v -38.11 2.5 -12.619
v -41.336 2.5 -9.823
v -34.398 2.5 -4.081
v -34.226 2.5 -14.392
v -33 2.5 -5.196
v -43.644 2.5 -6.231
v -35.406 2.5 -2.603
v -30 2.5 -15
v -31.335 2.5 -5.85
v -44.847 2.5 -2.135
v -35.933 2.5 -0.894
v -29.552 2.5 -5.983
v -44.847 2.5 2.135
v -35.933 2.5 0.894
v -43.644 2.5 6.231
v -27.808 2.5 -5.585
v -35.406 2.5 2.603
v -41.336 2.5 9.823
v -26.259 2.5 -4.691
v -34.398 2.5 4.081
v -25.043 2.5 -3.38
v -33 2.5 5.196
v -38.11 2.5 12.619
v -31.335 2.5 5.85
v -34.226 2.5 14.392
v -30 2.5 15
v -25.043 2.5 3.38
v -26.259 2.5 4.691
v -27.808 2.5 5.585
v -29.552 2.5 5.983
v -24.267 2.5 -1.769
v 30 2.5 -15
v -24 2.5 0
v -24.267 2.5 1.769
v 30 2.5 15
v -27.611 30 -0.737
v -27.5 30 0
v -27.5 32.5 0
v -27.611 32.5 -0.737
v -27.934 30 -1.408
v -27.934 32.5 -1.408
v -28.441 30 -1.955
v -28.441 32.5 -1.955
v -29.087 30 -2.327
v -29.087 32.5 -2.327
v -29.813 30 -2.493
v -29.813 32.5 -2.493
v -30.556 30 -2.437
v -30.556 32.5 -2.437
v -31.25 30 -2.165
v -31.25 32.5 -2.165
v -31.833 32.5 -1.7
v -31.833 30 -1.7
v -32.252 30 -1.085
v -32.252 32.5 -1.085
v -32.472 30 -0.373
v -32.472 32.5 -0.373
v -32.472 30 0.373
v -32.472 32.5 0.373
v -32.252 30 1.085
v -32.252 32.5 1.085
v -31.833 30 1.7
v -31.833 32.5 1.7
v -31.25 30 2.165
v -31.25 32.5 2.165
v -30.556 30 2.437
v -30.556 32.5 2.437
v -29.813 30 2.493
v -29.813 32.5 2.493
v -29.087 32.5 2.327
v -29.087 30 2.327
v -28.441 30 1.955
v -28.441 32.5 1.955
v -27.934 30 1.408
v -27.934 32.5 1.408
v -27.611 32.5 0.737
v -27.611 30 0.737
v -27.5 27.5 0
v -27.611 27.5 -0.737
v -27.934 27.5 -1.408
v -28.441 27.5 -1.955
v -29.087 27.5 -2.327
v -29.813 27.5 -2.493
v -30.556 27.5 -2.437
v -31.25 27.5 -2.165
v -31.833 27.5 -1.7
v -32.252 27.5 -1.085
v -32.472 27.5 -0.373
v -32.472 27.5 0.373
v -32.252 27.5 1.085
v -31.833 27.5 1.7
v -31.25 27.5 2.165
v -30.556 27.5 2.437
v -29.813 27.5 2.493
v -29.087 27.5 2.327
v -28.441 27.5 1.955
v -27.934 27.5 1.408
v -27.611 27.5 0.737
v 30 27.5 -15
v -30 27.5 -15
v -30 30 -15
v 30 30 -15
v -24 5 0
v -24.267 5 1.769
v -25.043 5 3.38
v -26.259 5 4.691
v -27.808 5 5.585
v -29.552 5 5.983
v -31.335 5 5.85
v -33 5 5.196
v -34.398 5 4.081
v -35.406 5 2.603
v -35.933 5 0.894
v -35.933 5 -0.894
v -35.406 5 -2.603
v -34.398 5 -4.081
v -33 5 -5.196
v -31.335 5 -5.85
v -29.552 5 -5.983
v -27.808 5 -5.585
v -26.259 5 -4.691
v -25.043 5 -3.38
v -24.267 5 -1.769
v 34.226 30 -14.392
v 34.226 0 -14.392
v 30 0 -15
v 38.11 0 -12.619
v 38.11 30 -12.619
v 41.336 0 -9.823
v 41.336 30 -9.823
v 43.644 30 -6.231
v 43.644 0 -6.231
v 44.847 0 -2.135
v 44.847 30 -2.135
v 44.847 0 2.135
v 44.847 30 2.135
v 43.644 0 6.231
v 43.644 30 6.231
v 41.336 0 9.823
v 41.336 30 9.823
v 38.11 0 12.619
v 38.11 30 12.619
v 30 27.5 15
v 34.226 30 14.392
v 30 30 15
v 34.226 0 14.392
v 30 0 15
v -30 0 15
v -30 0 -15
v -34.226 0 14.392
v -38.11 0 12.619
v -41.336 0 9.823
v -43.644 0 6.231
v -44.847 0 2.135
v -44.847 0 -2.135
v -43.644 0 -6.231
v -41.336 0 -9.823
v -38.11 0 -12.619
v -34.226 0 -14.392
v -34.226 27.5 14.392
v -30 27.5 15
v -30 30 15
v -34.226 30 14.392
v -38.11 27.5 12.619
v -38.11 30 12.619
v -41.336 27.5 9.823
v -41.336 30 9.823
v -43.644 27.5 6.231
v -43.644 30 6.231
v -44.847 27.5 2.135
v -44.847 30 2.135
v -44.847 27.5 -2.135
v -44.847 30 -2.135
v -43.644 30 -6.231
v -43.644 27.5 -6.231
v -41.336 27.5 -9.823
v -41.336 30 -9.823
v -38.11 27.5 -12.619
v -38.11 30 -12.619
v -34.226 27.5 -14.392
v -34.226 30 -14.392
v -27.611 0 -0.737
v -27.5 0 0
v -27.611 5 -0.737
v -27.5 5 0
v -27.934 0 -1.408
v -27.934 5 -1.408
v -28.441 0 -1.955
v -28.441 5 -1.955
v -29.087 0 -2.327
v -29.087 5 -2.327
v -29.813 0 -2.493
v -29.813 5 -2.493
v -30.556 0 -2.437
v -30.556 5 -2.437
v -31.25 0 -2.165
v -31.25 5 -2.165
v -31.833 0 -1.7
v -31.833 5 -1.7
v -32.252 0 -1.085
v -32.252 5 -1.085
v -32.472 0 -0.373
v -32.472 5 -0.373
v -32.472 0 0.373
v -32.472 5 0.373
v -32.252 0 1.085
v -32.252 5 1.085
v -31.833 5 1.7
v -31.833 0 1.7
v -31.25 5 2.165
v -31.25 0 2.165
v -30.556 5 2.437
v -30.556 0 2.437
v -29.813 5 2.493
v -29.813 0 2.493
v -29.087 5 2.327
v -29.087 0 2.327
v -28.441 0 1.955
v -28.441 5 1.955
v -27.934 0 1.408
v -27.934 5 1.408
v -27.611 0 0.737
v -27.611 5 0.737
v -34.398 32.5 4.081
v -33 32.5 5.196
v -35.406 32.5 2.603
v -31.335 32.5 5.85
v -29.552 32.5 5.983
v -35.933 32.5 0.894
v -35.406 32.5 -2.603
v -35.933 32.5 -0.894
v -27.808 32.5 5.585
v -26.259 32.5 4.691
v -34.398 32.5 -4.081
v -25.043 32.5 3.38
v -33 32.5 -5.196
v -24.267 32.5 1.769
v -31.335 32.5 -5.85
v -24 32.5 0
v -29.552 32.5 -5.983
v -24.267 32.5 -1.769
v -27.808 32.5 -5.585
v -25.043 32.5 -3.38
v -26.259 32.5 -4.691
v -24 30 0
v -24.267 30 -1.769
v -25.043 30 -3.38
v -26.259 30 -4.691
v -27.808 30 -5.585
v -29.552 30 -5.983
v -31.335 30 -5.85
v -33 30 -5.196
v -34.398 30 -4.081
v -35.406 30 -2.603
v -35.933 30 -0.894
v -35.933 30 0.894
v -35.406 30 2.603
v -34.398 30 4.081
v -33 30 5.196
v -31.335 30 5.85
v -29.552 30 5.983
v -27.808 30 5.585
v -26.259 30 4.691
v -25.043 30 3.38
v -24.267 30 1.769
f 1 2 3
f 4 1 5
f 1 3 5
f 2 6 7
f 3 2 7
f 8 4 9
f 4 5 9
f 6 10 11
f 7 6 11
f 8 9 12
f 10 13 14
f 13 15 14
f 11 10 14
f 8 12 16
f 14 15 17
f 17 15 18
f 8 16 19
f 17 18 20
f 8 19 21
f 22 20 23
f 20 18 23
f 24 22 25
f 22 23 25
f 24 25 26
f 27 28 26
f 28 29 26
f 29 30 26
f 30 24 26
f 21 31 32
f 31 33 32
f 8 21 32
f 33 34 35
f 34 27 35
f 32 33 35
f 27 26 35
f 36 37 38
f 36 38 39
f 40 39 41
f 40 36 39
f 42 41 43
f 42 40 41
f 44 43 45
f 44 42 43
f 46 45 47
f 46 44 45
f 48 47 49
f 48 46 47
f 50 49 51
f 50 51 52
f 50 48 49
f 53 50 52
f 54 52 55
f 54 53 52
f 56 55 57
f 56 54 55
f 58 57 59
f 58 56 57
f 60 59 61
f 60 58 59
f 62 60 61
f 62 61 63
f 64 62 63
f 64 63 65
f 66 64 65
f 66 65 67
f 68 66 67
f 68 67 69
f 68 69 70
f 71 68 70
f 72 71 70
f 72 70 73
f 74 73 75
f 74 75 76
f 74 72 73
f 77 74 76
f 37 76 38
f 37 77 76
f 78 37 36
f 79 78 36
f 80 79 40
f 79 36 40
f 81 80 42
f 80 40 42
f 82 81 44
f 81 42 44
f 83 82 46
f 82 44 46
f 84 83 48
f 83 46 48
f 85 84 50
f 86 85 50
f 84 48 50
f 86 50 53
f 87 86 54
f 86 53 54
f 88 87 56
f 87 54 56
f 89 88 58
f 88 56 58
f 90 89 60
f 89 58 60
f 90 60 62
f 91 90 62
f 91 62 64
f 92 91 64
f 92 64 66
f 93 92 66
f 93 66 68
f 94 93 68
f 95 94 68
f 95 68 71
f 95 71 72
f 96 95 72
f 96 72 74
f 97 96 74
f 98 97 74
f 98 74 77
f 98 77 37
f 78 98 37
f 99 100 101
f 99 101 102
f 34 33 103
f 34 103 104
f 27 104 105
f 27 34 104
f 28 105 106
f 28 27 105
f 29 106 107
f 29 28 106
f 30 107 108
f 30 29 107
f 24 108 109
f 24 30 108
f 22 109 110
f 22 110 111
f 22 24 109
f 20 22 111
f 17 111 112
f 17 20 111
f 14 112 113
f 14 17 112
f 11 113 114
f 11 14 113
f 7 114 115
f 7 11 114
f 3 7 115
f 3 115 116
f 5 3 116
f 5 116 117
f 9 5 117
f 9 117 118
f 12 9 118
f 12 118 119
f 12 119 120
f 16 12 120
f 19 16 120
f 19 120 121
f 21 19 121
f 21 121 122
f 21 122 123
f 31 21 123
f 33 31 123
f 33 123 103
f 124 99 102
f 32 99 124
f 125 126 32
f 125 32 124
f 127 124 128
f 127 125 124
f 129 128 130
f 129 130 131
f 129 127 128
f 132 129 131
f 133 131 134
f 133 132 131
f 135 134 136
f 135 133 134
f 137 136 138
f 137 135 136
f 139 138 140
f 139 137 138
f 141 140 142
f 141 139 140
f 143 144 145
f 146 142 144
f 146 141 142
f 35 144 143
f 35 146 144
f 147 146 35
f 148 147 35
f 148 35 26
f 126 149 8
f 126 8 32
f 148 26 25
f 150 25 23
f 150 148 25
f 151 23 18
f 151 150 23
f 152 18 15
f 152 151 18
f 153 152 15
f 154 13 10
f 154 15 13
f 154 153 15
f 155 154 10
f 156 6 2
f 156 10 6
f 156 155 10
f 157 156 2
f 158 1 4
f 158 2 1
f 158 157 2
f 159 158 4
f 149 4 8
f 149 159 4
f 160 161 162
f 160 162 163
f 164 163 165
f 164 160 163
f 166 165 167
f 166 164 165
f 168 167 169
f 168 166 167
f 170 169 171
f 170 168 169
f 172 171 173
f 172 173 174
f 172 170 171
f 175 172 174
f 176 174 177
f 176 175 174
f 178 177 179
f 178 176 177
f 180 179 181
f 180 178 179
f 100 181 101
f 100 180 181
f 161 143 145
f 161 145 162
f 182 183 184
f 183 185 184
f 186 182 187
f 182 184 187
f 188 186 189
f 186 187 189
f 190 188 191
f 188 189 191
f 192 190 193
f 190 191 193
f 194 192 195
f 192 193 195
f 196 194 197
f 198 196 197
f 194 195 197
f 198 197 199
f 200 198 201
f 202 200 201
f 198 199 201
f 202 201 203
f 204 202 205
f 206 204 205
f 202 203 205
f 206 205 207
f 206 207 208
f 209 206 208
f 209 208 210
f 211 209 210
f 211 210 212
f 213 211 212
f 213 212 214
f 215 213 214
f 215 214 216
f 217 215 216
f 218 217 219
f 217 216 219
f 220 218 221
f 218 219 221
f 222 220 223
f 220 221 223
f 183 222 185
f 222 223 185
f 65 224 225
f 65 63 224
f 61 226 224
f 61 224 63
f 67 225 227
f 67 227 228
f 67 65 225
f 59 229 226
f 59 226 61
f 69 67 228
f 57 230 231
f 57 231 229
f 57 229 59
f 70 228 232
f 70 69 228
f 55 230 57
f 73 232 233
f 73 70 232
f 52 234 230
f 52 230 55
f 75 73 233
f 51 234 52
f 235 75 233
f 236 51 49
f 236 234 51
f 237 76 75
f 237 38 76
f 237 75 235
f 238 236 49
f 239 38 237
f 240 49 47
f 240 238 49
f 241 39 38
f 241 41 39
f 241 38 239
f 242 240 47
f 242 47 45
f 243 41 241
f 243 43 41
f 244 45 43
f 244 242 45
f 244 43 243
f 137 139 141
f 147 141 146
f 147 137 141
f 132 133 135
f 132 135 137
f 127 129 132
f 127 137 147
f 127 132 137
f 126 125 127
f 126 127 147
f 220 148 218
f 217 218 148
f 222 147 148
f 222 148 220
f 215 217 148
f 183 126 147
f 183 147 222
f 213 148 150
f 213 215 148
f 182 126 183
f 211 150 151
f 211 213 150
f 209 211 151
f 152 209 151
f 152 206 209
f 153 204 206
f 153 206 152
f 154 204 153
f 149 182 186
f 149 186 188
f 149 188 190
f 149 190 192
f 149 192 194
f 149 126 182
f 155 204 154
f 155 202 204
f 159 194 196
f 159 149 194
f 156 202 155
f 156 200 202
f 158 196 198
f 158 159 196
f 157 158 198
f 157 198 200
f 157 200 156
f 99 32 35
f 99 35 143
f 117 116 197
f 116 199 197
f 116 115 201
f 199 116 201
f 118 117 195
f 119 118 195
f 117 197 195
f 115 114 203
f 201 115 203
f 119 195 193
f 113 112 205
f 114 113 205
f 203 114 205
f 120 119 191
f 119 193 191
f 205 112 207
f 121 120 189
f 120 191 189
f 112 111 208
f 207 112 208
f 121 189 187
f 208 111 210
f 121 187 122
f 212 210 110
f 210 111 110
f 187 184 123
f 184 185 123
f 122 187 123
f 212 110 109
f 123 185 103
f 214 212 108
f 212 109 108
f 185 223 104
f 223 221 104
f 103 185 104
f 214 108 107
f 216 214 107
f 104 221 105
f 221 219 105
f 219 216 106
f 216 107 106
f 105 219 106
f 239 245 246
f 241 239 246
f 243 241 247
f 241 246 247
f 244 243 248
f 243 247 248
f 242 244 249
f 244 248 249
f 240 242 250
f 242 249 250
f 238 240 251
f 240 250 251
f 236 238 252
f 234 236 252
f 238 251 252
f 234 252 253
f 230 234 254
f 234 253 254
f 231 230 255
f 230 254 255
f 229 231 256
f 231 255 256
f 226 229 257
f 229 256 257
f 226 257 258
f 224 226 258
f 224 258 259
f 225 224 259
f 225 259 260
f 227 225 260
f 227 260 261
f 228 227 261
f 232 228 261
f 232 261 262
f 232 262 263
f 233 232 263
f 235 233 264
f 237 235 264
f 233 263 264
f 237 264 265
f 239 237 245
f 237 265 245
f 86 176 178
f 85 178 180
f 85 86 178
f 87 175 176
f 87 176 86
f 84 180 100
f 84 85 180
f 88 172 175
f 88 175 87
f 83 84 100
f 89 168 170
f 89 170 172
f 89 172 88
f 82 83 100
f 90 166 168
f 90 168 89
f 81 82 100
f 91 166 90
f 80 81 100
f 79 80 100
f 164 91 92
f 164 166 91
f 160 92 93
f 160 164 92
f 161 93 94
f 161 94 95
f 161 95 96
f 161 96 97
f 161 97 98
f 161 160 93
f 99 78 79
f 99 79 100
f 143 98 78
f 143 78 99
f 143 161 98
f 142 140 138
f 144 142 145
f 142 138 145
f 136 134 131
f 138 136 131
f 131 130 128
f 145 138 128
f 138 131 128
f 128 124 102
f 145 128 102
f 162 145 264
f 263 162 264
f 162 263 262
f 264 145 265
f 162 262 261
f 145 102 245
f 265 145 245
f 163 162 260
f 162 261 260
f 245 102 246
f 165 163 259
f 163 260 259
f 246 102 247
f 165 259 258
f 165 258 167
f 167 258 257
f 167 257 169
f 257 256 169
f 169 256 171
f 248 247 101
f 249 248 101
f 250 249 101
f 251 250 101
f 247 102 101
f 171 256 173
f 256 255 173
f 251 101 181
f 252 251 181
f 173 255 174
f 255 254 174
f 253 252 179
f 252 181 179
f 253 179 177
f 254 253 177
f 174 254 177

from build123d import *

# Parameters (mm, degrees)
BOSS_EXTRUDE1_DEPTH     = 30
SKETCH4_R               = 2.5
CUT_EXTRUDE1_DEPTH      = 1
CUT_EXTRUDE1_DEPTH_BACK = 46
SKETCH6_W               = 75
SKETCH6_H               = 25
CUT_EXTRUDE3_DEPTH      = 31
SKETCH7_R               = 6
SKETCH7_R_2             = 2.5
BOSS_EXTRUDE2_DEPTH     = 2.5
SKETCH8_R               = 6
SKETCH8_R_2             = 2.5
BOSS_EXTRUDE3_DEPTH     = 5


with BuildPart() as part:
    # Sketch1 → Boss-Extrude1 (new body)
    with BuildSketch(Plane(origin=(0, 0, 0), x_dir=(1, 0, 0), z_dir=(0, 1, 0))):
        with BuildLine():
            Line((-30, 15), (30, 15))
            ThreePointArc((30, 15), (45, 0), (30, -15))
            Line((30, -15), (-30, -15))
            ThreePointArc((-30, -15), (-45, 0), (-30, 15))
        make_face()
    extrude(amount=BOSS_EXTRUDE1_DEPTH)

    # Sketch4 → Cut-Extrude1 (cut, two sides)
    with BuildSketch(Plane(origin=(0, 30, 0), x_dir=(1, 0, 0), z_dir=(0, 1, 0))) as cut_extrude1_sk:
        with Locations((-30, 0)):
            Circle(SKETCH4_R)
    extrude(amount=CUT_EXTRUDE1_DEPTH, mode=Mode.SUBTRACT)
    extrude(cut_extrude1_sk.sketch, amount=-CUT_EXTRUDE1_DEPTH_BACK, mode=Mode.SUBTRACT)

    # Sketch6 → Cut-Extrude3 (cut, through all)
    with BuildSketch(Plane.XY.offset(15)):
        with Locations((-7.5, 15)):
            Rectangle(SKETCH6_W, SKETCH6_H)
    extrude(amount=-CUT_EXTRUDE3_DEPTH, mode=Mode.SUBTRACT)

    # Sketch7 → Boss-Extrude2 (add)
    with BuildSketch(Plane(origin=(0, 30, 0), x_dir=(1, 0, 0), z_dir=(0, 1, 0))):
        with Locations((-30, 0)):
            Circle(SKETCH7_R)
        with Locations((-30, 0)):
            Circle(SKETCH7_R_2, mode=Mode.SUBTRACT)
    extrude(amount=BOSS_EXTRUDE2_DEPTH)

    # Sketch8 → Boss-Extrude3 (add)
    with BuildSketch(Plane.XZ):
        with Locations((-30, 0)):
            Circle(SKETCH8_R)
        with Locations((-30, 0)):
            Circle(SKETCH8_R_2, mode=Mode.SUBTRACT)
    extrude(amount=-BOSS_EXTRUDE3_DEPTH)


solid = part.part
